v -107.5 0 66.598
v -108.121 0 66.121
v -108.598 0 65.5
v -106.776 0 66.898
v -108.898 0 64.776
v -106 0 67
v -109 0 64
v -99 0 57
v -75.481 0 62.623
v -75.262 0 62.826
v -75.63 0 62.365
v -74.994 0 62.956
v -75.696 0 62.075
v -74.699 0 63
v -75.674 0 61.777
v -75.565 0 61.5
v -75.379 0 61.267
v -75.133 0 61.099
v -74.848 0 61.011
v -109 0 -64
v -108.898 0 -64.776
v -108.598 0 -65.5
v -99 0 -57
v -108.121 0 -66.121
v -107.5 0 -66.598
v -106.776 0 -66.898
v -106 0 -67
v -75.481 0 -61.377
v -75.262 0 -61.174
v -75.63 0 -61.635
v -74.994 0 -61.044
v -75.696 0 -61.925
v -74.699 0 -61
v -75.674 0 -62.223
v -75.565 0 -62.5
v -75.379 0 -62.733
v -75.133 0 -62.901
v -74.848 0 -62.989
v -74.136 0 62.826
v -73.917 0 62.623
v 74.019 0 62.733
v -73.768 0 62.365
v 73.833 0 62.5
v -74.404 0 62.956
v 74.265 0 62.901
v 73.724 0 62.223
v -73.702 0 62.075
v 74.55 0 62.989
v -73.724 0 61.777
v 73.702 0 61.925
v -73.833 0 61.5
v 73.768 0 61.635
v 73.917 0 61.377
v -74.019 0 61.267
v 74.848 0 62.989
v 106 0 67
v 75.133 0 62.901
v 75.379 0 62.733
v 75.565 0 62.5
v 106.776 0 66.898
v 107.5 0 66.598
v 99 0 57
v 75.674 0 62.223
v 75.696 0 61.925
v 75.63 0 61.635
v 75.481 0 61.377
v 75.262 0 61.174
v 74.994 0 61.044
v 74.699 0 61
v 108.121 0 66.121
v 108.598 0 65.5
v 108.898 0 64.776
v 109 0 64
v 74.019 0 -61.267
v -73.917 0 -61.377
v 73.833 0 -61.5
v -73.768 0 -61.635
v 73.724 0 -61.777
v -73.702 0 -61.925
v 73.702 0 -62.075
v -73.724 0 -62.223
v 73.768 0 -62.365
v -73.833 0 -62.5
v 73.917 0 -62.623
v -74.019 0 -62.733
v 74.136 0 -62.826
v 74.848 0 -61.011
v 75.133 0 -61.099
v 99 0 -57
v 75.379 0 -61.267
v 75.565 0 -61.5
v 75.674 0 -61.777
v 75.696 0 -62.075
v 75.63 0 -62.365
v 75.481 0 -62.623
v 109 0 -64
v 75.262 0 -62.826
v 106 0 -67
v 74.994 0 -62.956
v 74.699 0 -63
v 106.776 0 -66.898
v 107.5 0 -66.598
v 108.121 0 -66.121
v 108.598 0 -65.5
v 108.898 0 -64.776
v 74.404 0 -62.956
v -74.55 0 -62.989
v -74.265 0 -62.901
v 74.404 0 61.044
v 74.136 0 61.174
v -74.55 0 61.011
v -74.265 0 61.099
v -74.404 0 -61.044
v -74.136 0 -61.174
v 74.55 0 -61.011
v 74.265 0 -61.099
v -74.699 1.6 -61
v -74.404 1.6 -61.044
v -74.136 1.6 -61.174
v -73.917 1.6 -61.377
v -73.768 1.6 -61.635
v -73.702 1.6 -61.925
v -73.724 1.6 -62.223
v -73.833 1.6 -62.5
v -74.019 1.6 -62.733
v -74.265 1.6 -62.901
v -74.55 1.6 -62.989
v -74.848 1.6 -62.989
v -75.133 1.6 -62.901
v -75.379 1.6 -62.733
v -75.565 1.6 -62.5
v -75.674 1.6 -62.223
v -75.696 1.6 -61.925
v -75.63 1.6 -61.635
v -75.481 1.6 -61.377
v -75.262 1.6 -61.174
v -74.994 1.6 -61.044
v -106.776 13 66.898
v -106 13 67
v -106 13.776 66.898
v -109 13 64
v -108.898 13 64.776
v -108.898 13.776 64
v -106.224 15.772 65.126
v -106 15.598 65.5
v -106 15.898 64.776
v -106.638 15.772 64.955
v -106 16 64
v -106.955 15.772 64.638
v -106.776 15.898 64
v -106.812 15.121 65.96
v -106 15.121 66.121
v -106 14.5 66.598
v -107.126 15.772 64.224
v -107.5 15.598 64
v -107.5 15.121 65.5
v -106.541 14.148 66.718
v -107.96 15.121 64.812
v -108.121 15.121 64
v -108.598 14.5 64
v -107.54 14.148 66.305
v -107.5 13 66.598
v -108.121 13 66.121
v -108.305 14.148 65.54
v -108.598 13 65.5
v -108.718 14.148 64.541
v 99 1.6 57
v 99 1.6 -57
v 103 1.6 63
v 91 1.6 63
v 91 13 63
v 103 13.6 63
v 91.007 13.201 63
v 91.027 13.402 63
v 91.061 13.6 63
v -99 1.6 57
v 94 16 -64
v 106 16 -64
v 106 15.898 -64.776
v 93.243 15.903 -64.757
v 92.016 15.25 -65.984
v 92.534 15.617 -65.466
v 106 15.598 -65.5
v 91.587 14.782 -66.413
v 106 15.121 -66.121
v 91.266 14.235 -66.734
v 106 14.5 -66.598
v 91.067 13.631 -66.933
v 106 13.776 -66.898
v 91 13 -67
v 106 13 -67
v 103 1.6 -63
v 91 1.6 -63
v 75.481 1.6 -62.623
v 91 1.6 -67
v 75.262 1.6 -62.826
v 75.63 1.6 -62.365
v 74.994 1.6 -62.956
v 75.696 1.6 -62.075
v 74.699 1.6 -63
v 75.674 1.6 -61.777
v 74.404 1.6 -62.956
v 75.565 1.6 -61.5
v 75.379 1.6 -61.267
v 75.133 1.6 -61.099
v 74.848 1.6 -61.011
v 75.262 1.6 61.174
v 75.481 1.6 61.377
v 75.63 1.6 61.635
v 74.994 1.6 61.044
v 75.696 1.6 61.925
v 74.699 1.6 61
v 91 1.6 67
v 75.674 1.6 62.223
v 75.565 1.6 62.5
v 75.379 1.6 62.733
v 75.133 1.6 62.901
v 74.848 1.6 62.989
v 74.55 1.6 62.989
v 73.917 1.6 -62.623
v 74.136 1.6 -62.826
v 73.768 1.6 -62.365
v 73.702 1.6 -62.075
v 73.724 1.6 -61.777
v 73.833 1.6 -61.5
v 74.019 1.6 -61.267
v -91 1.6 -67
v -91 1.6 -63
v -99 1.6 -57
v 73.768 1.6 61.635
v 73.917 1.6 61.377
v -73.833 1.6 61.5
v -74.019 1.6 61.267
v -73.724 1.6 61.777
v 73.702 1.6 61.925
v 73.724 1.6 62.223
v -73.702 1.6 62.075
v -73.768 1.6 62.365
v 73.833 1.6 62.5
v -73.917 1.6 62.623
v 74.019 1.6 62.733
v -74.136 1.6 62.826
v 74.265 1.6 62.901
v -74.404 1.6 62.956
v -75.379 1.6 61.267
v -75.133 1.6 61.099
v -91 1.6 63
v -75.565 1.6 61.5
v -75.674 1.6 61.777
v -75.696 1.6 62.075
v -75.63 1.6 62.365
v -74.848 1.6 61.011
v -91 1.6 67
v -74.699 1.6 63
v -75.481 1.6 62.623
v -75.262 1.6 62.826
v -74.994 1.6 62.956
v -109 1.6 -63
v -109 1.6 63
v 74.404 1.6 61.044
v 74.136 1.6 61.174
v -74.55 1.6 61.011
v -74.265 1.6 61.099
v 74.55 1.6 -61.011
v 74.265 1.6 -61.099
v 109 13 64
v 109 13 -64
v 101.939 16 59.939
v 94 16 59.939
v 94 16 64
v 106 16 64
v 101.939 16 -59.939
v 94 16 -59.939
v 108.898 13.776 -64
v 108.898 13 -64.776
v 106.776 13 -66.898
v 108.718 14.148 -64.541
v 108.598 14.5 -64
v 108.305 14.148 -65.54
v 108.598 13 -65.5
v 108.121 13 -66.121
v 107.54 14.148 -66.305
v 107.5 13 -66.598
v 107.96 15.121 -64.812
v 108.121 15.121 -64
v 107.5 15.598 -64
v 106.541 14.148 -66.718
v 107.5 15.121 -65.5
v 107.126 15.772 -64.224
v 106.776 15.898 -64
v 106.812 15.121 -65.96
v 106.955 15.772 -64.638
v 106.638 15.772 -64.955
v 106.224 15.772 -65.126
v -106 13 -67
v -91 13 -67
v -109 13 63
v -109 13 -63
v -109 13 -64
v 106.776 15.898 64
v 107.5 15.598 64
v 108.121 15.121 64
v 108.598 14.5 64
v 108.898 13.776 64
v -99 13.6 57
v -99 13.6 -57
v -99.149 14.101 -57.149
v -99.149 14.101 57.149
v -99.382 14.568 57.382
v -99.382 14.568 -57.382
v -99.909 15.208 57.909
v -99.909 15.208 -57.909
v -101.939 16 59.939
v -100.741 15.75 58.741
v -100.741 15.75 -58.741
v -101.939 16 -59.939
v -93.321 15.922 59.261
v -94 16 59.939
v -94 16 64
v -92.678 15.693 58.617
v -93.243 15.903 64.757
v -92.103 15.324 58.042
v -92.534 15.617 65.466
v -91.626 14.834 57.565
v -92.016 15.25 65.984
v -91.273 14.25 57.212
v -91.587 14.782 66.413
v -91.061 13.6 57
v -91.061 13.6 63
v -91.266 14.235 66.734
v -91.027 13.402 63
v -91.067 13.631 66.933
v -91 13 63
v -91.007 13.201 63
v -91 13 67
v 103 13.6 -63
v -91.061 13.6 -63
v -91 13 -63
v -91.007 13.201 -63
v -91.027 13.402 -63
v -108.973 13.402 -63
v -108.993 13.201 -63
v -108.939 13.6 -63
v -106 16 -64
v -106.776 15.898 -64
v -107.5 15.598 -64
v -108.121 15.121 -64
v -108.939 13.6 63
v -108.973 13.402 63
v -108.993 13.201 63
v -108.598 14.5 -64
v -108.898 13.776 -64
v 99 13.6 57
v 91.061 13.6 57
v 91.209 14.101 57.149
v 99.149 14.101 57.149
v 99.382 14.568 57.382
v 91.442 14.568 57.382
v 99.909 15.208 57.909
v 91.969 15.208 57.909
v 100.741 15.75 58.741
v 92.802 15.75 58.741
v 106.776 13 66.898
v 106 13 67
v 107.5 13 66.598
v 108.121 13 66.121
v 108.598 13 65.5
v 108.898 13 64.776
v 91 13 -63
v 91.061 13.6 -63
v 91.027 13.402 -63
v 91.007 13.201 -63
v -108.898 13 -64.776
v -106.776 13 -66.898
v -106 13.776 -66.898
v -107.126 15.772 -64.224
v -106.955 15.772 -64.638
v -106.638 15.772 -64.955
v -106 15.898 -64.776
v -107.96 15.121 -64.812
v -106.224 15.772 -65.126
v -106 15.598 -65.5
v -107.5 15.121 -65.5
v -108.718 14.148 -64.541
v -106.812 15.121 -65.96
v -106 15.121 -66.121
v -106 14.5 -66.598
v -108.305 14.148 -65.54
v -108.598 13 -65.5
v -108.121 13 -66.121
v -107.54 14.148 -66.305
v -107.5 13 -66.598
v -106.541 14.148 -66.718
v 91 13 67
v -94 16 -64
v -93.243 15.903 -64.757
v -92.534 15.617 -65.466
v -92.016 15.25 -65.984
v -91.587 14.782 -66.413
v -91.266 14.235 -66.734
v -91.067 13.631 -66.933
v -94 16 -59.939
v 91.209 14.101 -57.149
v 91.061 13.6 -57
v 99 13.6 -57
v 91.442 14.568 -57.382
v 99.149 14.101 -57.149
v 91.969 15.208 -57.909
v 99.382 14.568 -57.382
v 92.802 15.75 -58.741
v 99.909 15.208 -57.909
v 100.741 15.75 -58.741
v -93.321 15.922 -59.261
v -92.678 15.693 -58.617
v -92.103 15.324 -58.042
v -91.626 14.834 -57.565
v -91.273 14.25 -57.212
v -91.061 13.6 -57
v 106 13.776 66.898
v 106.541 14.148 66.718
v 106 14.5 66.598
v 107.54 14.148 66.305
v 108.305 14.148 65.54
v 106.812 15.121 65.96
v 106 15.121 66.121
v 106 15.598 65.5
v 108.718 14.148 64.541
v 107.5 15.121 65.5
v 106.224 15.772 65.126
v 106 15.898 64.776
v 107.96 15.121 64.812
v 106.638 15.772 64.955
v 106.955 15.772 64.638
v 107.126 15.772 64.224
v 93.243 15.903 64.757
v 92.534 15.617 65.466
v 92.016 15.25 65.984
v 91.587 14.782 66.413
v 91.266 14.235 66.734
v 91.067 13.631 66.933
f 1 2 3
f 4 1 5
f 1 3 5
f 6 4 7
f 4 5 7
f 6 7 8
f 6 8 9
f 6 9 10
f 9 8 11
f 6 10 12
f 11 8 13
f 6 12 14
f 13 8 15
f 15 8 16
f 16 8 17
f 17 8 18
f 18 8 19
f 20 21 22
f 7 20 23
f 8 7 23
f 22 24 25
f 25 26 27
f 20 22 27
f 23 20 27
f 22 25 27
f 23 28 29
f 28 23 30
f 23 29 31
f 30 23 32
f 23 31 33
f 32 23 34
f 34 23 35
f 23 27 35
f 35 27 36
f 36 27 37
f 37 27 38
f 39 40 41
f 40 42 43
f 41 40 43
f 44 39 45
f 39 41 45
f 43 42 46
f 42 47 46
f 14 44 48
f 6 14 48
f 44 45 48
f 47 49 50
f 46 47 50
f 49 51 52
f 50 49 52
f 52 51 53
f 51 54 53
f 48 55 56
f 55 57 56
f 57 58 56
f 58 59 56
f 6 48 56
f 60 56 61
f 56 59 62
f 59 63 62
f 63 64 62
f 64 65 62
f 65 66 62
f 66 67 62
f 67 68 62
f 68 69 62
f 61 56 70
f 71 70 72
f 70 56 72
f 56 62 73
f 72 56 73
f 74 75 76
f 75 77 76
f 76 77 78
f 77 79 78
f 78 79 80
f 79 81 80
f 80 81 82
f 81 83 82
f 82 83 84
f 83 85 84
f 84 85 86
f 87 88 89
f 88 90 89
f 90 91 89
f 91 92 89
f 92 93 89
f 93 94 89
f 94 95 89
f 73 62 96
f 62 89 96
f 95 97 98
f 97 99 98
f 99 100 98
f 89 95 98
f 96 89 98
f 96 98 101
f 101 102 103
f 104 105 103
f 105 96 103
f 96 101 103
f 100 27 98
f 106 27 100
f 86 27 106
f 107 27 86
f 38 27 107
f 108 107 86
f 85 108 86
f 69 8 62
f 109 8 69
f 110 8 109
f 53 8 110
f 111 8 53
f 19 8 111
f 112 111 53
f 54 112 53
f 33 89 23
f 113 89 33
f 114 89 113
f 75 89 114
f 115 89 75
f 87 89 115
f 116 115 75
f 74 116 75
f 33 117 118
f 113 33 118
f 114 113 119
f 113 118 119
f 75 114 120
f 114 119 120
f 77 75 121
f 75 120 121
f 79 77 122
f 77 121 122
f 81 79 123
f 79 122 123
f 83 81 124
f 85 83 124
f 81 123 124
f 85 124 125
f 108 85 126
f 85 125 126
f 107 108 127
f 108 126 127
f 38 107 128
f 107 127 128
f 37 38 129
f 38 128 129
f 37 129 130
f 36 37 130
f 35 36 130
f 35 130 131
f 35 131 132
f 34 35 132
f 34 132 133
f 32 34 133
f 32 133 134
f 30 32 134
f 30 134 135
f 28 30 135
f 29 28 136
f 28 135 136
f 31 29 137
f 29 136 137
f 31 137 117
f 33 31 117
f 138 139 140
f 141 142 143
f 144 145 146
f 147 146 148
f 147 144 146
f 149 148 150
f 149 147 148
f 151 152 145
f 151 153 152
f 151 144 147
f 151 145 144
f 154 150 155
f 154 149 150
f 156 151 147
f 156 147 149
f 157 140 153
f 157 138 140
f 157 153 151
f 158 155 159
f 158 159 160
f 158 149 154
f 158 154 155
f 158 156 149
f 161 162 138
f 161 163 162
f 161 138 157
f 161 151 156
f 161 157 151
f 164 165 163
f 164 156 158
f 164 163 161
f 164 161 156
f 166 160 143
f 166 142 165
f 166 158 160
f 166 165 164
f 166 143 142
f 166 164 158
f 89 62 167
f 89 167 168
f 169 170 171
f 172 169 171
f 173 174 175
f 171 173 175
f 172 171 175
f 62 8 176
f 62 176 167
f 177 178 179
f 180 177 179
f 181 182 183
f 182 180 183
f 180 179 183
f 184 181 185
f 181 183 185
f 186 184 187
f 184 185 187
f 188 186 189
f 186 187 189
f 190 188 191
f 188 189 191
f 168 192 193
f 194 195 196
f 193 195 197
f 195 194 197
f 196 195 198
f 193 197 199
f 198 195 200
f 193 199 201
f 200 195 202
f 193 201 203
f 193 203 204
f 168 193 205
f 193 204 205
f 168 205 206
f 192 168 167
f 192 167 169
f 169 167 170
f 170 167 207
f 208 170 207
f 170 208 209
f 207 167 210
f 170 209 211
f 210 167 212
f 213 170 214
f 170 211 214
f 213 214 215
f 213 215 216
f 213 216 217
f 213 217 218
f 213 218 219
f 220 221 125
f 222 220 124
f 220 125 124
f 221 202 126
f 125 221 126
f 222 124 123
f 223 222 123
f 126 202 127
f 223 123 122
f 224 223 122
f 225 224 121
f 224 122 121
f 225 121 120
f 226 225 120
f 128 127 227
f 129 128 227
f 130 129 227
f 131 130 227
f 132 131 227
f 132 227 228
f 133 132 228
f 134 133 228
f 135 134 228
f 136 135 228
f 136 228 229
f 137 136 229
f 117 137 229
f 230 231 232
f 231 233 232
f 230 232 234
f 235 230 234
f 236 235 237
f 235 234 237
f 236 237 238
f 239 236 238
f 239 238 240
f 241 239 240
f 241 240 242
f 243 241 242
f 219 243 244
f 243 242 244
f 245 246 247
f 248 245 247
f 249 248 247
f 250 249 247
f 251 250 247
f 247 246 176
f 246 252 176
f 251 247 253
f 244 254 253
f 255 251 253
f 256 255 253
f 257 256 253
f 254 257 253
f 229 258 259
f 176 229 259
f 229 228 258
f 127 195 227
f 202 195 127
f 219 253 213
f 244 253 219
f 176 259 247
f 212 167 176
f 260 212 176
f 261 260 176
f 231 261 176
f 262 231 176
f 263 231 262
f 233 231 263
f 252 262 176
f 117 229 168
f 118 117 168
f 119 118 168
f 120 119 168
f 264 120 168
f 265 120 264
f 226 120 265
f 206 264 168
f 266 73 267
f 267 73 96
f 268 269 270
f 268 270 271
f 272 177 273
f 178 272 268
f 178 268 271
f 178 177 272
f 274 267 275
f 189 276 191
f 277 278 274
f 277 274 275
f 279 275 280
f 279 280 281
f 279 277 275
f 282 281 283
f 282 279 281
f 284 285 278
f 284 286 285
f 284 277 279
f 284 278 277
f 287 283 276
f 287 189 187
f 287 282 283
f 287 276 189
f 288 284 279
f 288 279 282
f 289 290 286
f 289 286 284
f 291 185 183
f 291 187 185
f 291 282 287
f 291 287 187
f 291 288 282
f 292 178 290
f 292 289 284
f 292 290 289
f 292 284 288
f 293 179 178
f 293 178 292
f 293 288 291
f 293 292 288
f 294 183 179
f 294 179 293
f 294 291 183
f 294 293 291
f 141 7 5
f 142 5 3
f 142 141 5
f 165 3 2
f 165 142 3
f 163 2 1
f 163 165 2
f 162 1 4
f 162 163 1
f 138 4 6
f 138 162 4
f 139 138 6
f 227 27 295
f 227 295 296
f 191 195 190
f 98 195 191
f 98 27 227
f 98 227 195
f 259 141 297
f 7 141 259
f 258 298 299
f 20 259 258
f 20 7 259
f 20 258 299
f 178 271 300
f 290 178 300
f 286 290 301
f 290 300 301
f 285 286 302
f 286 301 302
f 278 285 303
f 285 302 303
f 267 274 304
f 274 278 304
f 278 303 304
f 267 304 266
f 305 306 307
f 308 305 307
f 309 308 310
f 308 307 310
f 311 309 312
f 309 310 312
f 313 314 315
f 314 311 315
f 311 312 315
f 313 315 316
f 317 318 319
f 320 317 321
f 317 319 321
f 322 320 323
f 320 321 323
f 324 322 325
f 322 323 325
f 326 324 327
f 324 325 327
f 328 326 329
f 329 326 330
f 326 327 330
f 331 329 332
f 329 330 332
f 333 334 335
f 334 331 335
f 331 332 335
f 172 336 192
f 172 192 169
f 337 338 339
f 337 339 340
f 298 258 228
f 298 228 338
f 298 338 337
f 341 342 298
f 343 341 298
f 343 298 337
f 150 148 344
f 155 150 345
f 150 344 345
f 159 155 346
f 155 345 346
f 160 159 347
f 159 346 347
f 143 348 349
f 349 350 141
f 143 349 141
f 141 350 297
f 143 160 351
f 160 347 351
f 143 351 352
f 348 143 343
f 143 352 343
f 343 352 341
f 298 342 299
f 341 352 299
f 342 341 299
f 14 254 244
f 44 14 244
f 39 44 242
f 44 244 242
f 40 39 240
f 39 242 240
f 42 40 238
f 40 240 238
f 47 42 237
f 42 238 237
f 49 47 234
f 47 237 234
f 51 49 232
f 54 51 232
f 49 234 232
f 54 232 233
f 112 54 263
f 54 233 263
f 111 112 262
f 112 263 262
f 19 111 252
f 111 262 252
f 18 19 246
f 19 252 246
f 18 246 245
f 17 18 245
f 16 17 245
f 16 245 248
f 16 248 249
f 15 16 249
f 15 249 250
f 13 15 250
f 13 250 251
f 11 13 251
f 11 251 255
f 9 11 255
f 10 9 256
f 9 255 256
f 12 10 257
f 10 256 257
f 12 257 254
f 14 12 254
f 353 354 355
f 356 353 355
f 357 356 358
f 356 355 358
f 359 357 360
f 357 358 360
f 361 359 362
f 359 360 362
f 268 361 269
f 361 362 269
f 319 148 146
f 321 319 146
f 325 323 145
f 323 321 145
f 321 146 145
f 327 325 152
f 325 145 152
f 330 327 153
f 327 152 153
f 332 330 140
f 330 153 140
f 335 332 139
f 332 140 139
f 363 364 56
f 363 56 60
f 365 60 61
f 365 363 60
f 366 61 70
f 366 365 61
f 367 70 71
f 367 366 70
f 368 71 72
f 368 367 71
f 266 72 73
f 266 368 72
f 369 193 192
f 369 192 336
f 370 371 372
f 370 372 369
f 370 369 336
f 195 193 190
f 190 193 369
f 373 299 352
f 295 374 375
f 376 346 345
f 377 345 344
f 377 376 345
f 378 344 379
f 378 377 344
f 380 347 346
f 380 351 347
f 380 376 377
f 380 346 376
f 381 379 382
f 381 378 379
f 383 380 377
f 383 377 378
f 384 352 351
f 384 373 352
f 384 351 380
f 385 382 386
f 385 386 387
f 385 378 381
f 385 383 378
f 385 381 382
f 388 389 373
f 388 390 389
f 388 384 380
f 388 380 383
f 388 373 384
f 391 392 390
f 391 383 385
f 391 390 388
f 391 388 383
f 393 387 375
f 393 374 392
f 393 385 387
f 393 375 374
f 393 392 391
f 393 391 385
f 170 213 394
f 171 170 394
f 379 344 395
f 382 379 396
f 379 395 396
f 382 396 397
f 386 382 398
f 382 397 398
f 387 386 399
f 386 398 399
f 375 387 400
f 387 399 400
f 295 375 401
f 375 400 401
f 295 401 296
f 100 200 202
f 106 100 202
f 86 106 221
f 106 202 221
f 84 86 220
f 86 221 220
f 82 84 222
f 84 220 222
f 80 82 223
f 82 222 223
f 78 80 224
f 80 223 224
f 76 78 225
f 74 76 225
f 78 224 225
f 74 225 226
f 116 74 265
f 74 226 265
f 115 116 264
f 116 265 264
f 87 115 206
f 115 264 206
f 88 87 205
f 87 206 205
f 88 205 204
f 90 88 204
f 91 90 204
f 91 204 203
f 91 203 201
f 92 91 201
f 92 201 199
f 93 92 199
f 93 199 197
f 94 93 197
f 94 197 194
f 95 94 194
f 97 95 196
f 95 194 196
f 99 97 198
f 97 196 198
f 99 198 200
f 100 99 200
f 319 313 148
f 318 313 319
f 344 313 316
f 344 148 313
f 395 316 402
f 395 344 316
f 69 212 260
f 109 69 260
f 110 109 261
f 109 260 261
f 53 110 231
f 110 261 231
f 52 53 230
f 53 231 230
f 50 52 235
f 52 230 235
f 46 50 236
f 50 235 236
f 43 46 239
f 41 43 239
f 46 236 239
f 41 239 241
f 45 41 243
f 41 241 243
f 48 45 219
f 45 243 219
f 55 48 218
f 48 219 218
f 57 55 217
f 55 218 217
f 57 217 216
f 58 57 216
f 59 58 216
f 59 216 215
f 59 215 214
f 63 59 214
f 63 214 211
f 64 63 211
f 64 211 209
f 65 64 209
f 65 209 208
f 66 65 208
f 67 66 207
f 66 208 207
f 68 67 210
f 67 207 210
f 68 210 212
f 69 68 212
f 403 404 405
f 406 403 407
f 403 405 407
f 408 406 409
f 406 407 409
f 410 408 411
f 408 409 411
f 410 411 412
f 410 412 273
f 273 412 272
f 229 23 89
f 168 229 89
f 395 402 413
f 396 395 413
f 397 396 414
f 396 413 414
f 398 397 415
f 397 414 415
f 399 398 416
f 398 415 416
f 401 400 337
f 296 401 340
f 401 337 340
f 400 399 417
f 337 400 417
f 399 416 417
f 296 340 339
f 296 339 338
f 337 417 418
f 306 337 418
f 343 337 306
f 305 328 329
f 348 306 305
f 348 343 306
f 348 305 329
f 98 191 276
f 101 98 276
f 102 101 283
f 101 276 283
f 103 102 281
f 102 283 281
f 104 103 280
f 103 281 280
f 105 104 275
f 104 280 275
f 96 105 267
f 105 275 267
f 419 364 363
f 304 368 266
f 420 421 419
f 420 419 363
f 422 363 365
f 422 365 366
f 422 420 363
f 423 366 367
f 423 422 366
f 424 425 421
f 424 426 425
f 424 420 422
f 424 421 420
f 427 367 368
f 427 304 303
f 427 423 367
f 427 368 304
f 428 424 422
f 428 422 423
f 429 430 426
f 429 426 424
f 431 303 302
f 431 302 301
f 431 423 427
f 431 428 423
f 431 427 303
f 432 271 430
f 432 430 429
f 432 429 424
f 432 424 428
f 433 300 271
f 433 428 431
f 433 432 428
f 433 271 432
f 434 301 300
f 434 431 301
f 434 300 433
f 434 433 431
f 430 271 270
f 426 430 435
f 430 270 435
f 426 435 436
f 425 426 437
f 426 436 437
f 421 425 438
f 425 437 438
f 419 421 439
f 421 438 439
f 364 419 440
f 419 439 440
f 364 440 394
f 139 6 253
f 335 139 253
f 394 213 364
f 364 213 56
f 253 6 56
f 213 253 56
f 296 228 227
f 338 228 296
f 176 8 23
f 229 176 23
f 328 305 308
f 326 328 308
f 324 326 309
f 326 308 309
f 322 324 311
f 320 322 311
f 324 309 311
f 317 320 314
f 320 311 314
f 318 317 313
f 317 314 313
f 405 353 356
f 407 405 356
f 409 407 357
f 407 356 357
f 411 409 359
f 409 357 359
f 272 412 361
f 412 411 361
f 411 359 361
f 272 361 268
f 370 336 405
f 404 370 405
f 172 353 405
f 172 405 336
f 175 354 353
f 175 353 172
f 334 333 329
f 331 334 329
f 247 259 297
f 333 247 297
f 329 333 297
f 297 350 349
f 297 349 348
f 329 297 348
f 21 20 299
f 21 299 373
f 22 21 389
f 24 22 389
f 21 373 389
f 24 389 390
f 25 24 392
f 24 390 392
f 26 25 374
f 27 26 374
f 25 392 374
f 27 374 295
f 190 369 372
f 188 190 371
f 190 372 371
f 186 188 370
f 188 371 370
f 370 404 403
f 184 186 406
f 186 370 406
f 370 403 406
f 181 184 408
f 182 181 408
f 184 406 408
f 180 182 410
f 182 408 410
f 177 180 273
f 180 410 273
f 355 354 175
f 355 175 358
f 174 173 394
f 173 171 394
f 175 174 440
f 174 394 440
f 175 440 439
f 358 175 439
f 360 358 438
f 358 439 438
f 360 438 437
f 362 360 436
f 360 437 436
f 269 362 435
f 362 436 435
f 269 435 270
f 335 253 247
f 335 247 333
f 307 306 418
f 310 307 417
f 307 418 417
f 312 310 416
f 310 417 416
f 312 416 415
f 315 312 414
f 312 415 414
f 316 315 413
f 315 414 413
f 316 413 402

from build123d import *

# Parameters (mm, degrees)
SKETCH_219_W        = 218
SKETCH_219_H        = 134
SKETCH_219_W_2      = 198
SKETCH_219_H_2      = 114
EXTRUDE_2_DEPTH     = 16
SKETCH_2_W          = 126
SKETCH_2_H          = 12
CUT_EXTRUDE_1_DEPTH = 212
SKETCH_3_W          = 182
SKETCH_3_H          = 14.4
CUT_EXTRUDE_2_DEPTH = 134
SKETCH_4_R          = 1
CUT_EXTRUDE_3_DEPTH = 1.6
FILLET_1_R          = 3
FILLET_2_R          = 3
FILLET_3_R          = 3


with BuildPart() as part:
    # Sketch 219 → Бобышка-Вытянуть2 (new body)
    with BuildSketch(Plane(origin=(0, 0, 0), x_dir=(1, 0, 0), z_dir=(0, 1, 0))):
        Rectangle(SKETCH_219_W, SKETCH_219_H)
        Rectangle(SKETCH_219_W_2, SKETCH_219_H_2, mode=Mode.SUBTRACT)
    extrude(amount=EXTRUDE_2_DEPTH)

    # Эскиз2 → Вырез-Вытянуть1 (cut)
    with BuildSketch(Plane.ZY.offset(109)):
        with Locations((0, 7.6)):
            Rectangle(SKETCH_2_W, SKETCH_2_H)
    extrude(amount=-CUT_EXTRUDE_1_DEPTH, mode=Mode.SUBTRACT)

    # Эскиз3 → Вырез-Вытянуть2 (cut)
    with BuildSketch(Plane.XY.offset(67)):
        with Locations((0, 8.8)):
            Rectangle(SKETCH_3_W, SKETCH_3_H)
    extrude(amount=-CUT_EXTRUDE_2_DEPTH, mode=Mode.SUBTRACT)

    # Эскиз4 → Вырез-Вытянуть3 (cut)
    with BuildSketch(Plane(origin=(0, 1.6, 0), x_dir=(1, 0, 0), z_dir=(0, 1, 0))):
        with Locations(Location((-74.698916604, 62, 0), (0, 0, 270))):
            Circle(SKETCH_4_R)
        with Locations(Location((-74.698916604, -62, 0), (0, 0, 270))):
            Circle(SKETCH_4_R)
        with Locations(Location((74.698916604, -62, 0), (0, 0, 90))):
            Circle(SKETCH_4_R)
        with Locations(Location((74.698916604, 62, 0), (0, 0, 90))):
            Circle(SKETCH_4_R)
    extrude(amount=-CUT_EXTRUDE_3_DEPTH, mode=Mode.SUBTRACT)

    # Скругление1
    fillet_1_edges = [part.edges().sort_by_distance(p)[0] for p in [
        (109, 8, 67),
        (-109, 8, 67),
        (-109, 8, -67),
        (109, 8, -67),
    ]]
    fillet(fillet_1_edges, radius=FILLET_1_R)

    # Скругление2
    # the kernel refuses this fillet: 3 mm, written as the material it takes off along each edge
    with BuildSketch(Plane(origin=(-91, 16, -49.5), x_dir=(-1, 0, 0), z_dir=(0, 0, -1)), Plane(origin=(-91, 16, 74.5), x_dir=(-1, 0, 0), z_dir=(0, 0, -1))) as fillet_2_piece_1:
        with BuildLine():
            CenterArc((FILLET_2_R, -FILLET_2_R), FILLET_2_R, 90, 90)
            Line((0, -FILLET_2_R), (0, 0))
            Line((0, 0), (FILLET_2_R, 0))
        make_face()
    extrude(amount=25, mode=Mode.SUBTRACT)
    with BuildSketch(Plane(origin=(-83.651530772, 16, -57), x_dir=(0, 0, -1), z_dir=(-1, 0, 0)), Plane(origin=(-99, 16, 57), x_dir=(0, 0, 1), z_dir=(1, 0, 0))) as fillet_2_piece_2:
        with BuildLine():
            CenterArc((2.939387691, 3), FILLET_2_R, 191.536959033, 78.463040967)
            Line((0, 2.4), (0, 0))
            Line((0, 0), (2.939387691, 0))
        make_face()
    extrude(amount=15.348469228, mode=Mode.SUBTRACT)
    with BuildSketch(Plane(origin=(-99, 16, -57), x_dir=(-1, 0, 0), z_dir=(0, 0, 1))) as fillet_2_piece_3:
        with BuildLine():
            CenterArc((2.939387691, 3), FILLET_2_R, 191.536959033, 78.463040967)
            Line((0, 2.4), (0, 0))
            Line((0, 0), (2.939387691, 0))
        make_face()
    extrude(amount=114, mode=Mode.SUBTRACT)
    with BuildSketch(Plane(origin=(-106, 16, 67), x_dir=(0, -1, 0), z_dir=(1, 0, 0))) as fillet_2_piece_4:
        with BuildLine():
            CenterArc((FILLET_2_R, FILLET_2_R), FILLET_2_R, 180, 90)
            Line((0, FILLET_2_R), (0, 0))
            Line((0, 0), (FILLET_2_R, 0))
        make_face()
    extrude(amount=22.5, mode=Mode.SUBTRACT)
    with BuildSketch(Plane(origin=(-106, 16, 64), x_dir=(0, 0, 1), z_dir=(1, 0, 0))) as fillet_2_piece_5:
        with BuildLine():
            CenterArc((3 - FILLET_2_R, FILLET_2_R), FILLET_2_R, 270, 90)
            Line((3 - FILLET_2_R, 0), (3, 0))
            Line((3, 0), (3, FILLET_2_R))
        make_face()
    revolve(axis=Axis((-106, 16, 64), (0, -1, 0)), revolution_arc=90, mode=Mode.SUBTRACT)
    with BuildSketch(Plane(origin=(-109, 16, -64), x_dir=(1, 0, 0), z_dir=(0, 0, 1))) as fillet_2_piece_6:
        with BuildLine():
            CenterArc((FILLET_2_R, -FILLET_2_R), FILLET_2_R, 90, 90)
            Line((0, -FILLET_2_R), (0, 0))
            Line((0, 0), (FILLET_2_R, 0))
        make_face()
    extrude(amount=128, mode=Mode.SUBTRACT)
    with BuildSketch(Plane(origin=(-106, 16, -64), x_dir=(-1, 0, 0), z_dir=(0, 0, 1))) as fillet_2_piece_7:
        with BuildLine():
            CenterArc((3 - FILLET_2_R, FILLET_2_R), FILLET_2_R, 270, 90)
            Line((3, FILLET_2_R), (3, 0))
            Line((3, 0), (3 - FILLET_2_R, 0))
        make_face()
    revolve(axis=Axis((-106, 16, -64), (0, -1, 0)), revolution_arc=90, mode=Mode.SUBTRACT)
    with BuildSketch(Plane(origin=(-83.5, 16, -67), x_dir=(0, 0, 1), z_dir=(-1, 0, 0))) as fillet_2_piece_8:
        with BuildLine():
            CenterArc((FILLET_2_R, -FILLET_2_R), FILLET_2_R, 90, 90)
            Line((0, -FILLET_2_R), (0, 0))
            Line((0, 0), (FILLET_2_R, 0))
        make_face()
    extrude(amount=22.5, mode=Mode.SUBTRACT)
    with BuildSketch(Plane(origin=(-91, 16, -57), x_dir=(0, 0, -1), z_dir=(-1, 0, 0))) as fillet_2_piece_9a_section:
        with BuildLine():
            CenterArc((2.939387691, 3), FILLET_2_R, 191.536959033, 78.463040967)
            Line((0, 2.4), (0, 0))
            Line((0, 0), (2.939387691, 0))
        make_face()
    fillet_2_piece_9a = extrude(amount=15.348469228, mode=Mode.PRIVATE)
    fillet_2_piece_9a = split(fillet_2_piece_9a, bisect_by=Plane(origin=(-99, 16, -57), z_dir=(-1, 0, 0)), keep=Keep.TOP, mode=Mode.PRIVATE)
    with BuildSketch(Plane(origin=(-99, 16, -64.348469228), x_dir=(-1, 0, 0), z_dir=(0, 0, 1))) as fillet_2_piece_9b_section:
        with BuildLine():
            CenterArc((2.939387691, 3), FILLET_2_R, 191.536959033, 78.463040967)
            Line((0, 2.4), (0, 0))
            Line((0, 0), (2.939387691, 0))
        make_face()
    fillet_2_piece_9b = extrude(amount=121.348469228, mode=Mode.PRIVATE)
    fillet_2_piece_9b = split(fillet_2_piece_9b, bisect_by=Plane(origin=(-99, 16, -57), z_dir=(0, 0, -1)), keep=Keep.TOP, mode=Mode.PRIVATE)
    fillet_2_piece_9b = split(fillet_2_piece_9b, bisect_by=Plane(origin=(-99, 16, -63), z_dir=(0, 0, 1)), keep=Keep.TOP, mode=Mode.PRIVATE)
    fillet_2_piece_9 = fillet_2_piece_9a & fillet_2_piece_9b
    add(fillet_2_piece_9, mode=Mode.SUBTRACT)
    with BuildSketch(Plane(origin=(-106.348469228, 16, 57), x_dir=(0, 0, 1), z_dir=(1, 0, 0))) as fillet_2_piece_10a_section:
        with BuildLine():
            CenterArc((2.939387691, 3), FILLET_2_R, 191.536959033, 78.463040967)
            Line((0, 2.4), (0, 0))
            Line((0, 0), (2.939387691, 0))
        make_face()
    fillet_2_piece_10a = extrude(amount=15.348469228, mode=Mode.PRIVATE)
    fillet_2_piece_10a = split(fillet_2_piece_10a, bisect_by=Plane(origin=(-99, 16, 57), z_dir=(-1, 0, 0)), keep=Keep.TOP, mode=Mode.PRIVATE)
    with BuildSketch(Plane(origin=(-99, 16, -57), x_dir=(-1, 0, 0), z_dir=(0, 0, 1))) as fillet_2_piece_10b_section:
        with BuildLine():
            CenterArc((2.939387691, 3), FILLET_2_R, 191.536959033, 78.463040967)
            Line((0, 2.4), (0, 0))
            Line((0, 0), (2.939387691, 0))
        make_face()
    fillet_2_piece_10b = extrude(amount=121.348469228, mode=Mode.PRIVATE)
    fillet_2_piece_10b = split(fillet_2_piece_10b, bisect_by=Plane(origin=(-99, 16, 57), z_dir=(0, 0, 1)), keep=Keep.TOP, mode=Mode.PRIVATE)
    fillet_2_piece_10b = split(fillet_2_piece_10b, bisect_by=Plane(origin=(-99, 16, 63), z_dir=(0, 0, -1)), keep=Keep.TOP, mode=Mode.PRIVATE)
    fillet_2_piece_10 = fillet_2_piece_10a & fillet_2_piece_10b
    add(fillet_2_piece_10, mode=Mode.SUBTRACT)

    # Скругление3
    # the kernel refuses this fillet: 3 mm, written as the material it takes off along each edge
    with BuildSketch(Plane(origin=(106, 16, 64), x_dir=(0, 0, 1), z_dir=(-1, 0, 0))) as fillet_3_piece_1:
        with BuildLine():
            CenterArc((3 - FILLET_3_R, -FILLET_3_R), FILLET_3_R, 0, 90)
            Line((3, -FILLET_3_R), (3, 0))
            Line((3, 0), (3 - FILLET_3_R, 0))
        make_face()
    revolve(axis=Axis((106, 16, 64), (0, 1, 0)), revolution_arc=90, mode=Mode.SUBTRACT)
    with BuildSketch(Plane(origin=(83.5, 16, 67), x_dir=(0, -1, 0), z_dir=(1, 0, 0)), Plane(origin=(106, 16, -67), x_dir=(0, -1, 0), z_dir=(-1, 0, 0))) as fillet_3_piece_2:
        with BuildLine():
            CenterArc((FILLET_3_R, FILLET_3_R), FILLET_3_R, 180, 90)
            Line((0, FILLET_3_R), (0, 0))
            Line((0, 0), (FILLET_3_R, 0))
        make_face()
    extrude(amount=22.5, mode=Mode.SUBTRACT)
    with BuildSketch(Plane(origin=(91, 16, 74.5), x_dir=(0, -1, 0), z_dir=(0, 0, -1)), Plane(origin=(91, 16, -49.5), x_dir=(0, -1, 0), z_dir=(0, 0, -1))) as fillet_3_piece_3:
        with BuildLine():
            CenterArc((FILLET_3_R, -FILLET_3_R), FILLET_3_R, 90, 90)
            Line((0, -FILLET_3_R), (0, 0))
            Line((0, 0), (FILLET_3_R, 0))
        make_face()
    extrude(amount=25, mode=Mode.SUBTRACT)
    with BuildSketch(Plane(origin=(83.651530772, 16, 57), x_dir=(0, -1.0, 1.5720758028687117e-12), z_dir=(1, 0, 0)), Plane(origin=(99, 16, -57), x_dir=(0, -1.0, -1.5750363976010446e-12), z_dir=(-1, 0, 0))) as fillet_3_piece_4:
        with BuildLine():
            CenterArc((3, -2.939387691), FILLET_3_R, 101.536959033, 78.463040967)
            Line((0, -2.939387691), (0, 0))
            Line((0, 0), (2.4, 0))
        make_face()
    extrude(amount=15.348469228, mode=Mode.SUBTRACT)
    with BuildSketch(Plane(origin=(99, 16, 57), x_dir=(1.56911520813638e-12, -1.0, 0), z_dir=(0, 0, -1))) as fillet_3_piece_5:
        with BuildLine():
            CenterArc((3, -2.939387691), FILLET_3_R, 101.536959033, 78.463040967)
            Line((0, -2.939387691), (0, 0))
            Line((0, 0), (2.4, 0))
        make_face()
    extrude(amount=114, mode=Mode.SUBTRACT)
    with BuildSketch(Plane(origin=(106, 16, -64), x_dir=(1, 0, 0), z_dir=(0, 0, 1))) as fillet_3_piece_6:
        with BuildLine():
            CenterArc((3 - FILLET_3_R, -FILLET_3_R), FILLET_3_R, 0, 90)
            Line((3 - FILLET_3_R, 0), (3, 0))
            Line((3, 0), (3, -FILLET_3_R))
        make_face()
    revolve(axis=Axis((106, 16, -64), (0, 1, 0)), revolution_arc=90, mode=Mode.SUBTRACT)
    with BuildSketch(Plane(origin=(109, 16, 64), x_dir=(0, -1, 0), z_dir=(0, 0, -1))) as fillet_3_piece_7:
        with BuildLine():
            CenterArc((FILLET_3_R, FILLET_3_R), FILLET_3_R, 180, 90)
            Line((0, FILLET_3_R), (0, 0))
            Line((0, 0), (FILLET_3_R, 0))
        make_face()
    extrude(amount=128, mode=Mode.SUBTRACT)
    with BuildSketch(Plane(origin=(91, 16, 57), x_dir=(0, -1.0, 1.5720758028687117e-12), z_dir=(1, 0, 0))) as fillet_3_piece_8a_section:
        with BuildLine():
            CenterArc((3, -2.939387691), FILLET_3_R, 101.536959033, 78.463040967)
            Line((0, -2.939387691), (0, 0))
            Line((0, 0), (2.4, 0))
        make_face()
    fillet_3_piece_8a = extrude(amount=15.348469228, mode=Mode.PRIVATE)
    fillet_3_piece_8a = split(fillet_3_piece_8a, bisect_by=Plane(origin=(103, 16, 57), z_dir=(-1, 0, 0)), keep=Keep.TOP, mode=Mode.PRIVATE)
    fillet_3_piece_8a = split(fillet_3_piece_8a, bisect_by=Plane(origin=(99, 16, 57), z_dir=(1, 0, 0)), keep=Keep.TOP, mode=Mode.PRIVATE)
    with BuildSketch(Plane(origin=(99, 16, 64.348469228), x_dir=(1.56911520813638e-12, -1.0, 0), z_dir=(0, 0, -1))) as fillet_3_piece_8b_section:
        with BuildLine():
            CenterArc((3, -2.939387691), FILLET_3_R, 101.536959033, 78.463040967)
            Line((0, -2.939387691), (0, 0))
            Line((0, 0), (2.4, 0))
        make_face()
    fillet_3_piece_8b = extrude(amount=121.348469228, mode=Mode.PRIVATE)
    fillet_3_piece_8b = split(fillet_3_piece_8b, bisect_by=Plane(origin=(99, 16, 63), z_dir=(0, 0, -1)), keep=Keep.TOP, mode=Mode.PRIVATE)
    fillet_3_piece_8b = split(fillet_3_piece_8b, bisect_by=Plane(origin=(99, 16, 57), z_dir=(0, 0, 1)), keep=Keep.TOP, mode=Mode.PRIVATE)
    fillet_3_piece_8 = fillet_3_piece_8a & fillet_3_piece_8b
    add(fillet_3_piece_8, mode=Mode.SUBTRACT)
    with BuildSketch(Plane(origin=(99, 16, 57), x_dir=(1.56911520813638e-12, -1.0, 0), z_dir=(0, 0, -1))) as fillet_3_piece_9a_section:
        with BuildLine():
            CenterArc((3, -2.939387691), FILLET_3_R, 101.536959033, 78.463040967)
            Line((0, -2.939387691), (0, 0))
            Line((0, 0), (2.4, 0))
        make_face()
    fillet_3_piece_9a = extrude(amount=121.348469228, mode=Mode.PRIVATE)
    fillet_3_piece_9a = split(fillet_3_piece_9a, bisect_by=Plane(origin=(99, 16, -63), z_dir=(0, 0, 1)), keep=Keep.TOP, mode=Mode.PRIVATE)
    fillet_3_piece_9a = split(fillet_3_piece_9a, bisect_by=Plane(origin=(99, 16, -57), z_dir=(0, 0, -1)), keep=Keep.TOP, mode=Mode.PRIVATE)
    with BuildSketch(Plane(origin=(106.348469228, 16, -57), x_dir=(0, -1.0, -1.5750363976010446e-12), z_dir=(-1, 0, 0))) as fillet_3_piece_9b_section:
        with BuildLine():
            CenterArc((3, -2.939387691), FILLET_3_R, 101.536959033, 78.463040967)
            Line((0, -2.939387691), (0, 0))
            Line((0, 0), (2.4, 0))
        make_face()
    fillet_3_piece_9b = extrude(amount=15.348469228, mode=Mode.PRIVATE)
    fillet_3_piece_9b = split(fillet_3_piece_9b, bisect_by=Plane(origin=(103, 16, -57), z_dir=(-1, 0, 0)), keep=Keep.TOP, mode=Mode.PRIVATE)
    fillet_3_piece_9b = split(fillet_3_piece_9b, bisect_by=Plane(origin=(99, 16, -57), z_dir=(1, 0, 0)), keep=Keep.TOP, mode=Mode.PRIVATE)
    fillet_3_piece_9 = fillet_3_piece_9a & fillet_3_piece_9b
    add(fillet_3_piece_9, mode=Mode.SUBTRACT)


solid = part.part
